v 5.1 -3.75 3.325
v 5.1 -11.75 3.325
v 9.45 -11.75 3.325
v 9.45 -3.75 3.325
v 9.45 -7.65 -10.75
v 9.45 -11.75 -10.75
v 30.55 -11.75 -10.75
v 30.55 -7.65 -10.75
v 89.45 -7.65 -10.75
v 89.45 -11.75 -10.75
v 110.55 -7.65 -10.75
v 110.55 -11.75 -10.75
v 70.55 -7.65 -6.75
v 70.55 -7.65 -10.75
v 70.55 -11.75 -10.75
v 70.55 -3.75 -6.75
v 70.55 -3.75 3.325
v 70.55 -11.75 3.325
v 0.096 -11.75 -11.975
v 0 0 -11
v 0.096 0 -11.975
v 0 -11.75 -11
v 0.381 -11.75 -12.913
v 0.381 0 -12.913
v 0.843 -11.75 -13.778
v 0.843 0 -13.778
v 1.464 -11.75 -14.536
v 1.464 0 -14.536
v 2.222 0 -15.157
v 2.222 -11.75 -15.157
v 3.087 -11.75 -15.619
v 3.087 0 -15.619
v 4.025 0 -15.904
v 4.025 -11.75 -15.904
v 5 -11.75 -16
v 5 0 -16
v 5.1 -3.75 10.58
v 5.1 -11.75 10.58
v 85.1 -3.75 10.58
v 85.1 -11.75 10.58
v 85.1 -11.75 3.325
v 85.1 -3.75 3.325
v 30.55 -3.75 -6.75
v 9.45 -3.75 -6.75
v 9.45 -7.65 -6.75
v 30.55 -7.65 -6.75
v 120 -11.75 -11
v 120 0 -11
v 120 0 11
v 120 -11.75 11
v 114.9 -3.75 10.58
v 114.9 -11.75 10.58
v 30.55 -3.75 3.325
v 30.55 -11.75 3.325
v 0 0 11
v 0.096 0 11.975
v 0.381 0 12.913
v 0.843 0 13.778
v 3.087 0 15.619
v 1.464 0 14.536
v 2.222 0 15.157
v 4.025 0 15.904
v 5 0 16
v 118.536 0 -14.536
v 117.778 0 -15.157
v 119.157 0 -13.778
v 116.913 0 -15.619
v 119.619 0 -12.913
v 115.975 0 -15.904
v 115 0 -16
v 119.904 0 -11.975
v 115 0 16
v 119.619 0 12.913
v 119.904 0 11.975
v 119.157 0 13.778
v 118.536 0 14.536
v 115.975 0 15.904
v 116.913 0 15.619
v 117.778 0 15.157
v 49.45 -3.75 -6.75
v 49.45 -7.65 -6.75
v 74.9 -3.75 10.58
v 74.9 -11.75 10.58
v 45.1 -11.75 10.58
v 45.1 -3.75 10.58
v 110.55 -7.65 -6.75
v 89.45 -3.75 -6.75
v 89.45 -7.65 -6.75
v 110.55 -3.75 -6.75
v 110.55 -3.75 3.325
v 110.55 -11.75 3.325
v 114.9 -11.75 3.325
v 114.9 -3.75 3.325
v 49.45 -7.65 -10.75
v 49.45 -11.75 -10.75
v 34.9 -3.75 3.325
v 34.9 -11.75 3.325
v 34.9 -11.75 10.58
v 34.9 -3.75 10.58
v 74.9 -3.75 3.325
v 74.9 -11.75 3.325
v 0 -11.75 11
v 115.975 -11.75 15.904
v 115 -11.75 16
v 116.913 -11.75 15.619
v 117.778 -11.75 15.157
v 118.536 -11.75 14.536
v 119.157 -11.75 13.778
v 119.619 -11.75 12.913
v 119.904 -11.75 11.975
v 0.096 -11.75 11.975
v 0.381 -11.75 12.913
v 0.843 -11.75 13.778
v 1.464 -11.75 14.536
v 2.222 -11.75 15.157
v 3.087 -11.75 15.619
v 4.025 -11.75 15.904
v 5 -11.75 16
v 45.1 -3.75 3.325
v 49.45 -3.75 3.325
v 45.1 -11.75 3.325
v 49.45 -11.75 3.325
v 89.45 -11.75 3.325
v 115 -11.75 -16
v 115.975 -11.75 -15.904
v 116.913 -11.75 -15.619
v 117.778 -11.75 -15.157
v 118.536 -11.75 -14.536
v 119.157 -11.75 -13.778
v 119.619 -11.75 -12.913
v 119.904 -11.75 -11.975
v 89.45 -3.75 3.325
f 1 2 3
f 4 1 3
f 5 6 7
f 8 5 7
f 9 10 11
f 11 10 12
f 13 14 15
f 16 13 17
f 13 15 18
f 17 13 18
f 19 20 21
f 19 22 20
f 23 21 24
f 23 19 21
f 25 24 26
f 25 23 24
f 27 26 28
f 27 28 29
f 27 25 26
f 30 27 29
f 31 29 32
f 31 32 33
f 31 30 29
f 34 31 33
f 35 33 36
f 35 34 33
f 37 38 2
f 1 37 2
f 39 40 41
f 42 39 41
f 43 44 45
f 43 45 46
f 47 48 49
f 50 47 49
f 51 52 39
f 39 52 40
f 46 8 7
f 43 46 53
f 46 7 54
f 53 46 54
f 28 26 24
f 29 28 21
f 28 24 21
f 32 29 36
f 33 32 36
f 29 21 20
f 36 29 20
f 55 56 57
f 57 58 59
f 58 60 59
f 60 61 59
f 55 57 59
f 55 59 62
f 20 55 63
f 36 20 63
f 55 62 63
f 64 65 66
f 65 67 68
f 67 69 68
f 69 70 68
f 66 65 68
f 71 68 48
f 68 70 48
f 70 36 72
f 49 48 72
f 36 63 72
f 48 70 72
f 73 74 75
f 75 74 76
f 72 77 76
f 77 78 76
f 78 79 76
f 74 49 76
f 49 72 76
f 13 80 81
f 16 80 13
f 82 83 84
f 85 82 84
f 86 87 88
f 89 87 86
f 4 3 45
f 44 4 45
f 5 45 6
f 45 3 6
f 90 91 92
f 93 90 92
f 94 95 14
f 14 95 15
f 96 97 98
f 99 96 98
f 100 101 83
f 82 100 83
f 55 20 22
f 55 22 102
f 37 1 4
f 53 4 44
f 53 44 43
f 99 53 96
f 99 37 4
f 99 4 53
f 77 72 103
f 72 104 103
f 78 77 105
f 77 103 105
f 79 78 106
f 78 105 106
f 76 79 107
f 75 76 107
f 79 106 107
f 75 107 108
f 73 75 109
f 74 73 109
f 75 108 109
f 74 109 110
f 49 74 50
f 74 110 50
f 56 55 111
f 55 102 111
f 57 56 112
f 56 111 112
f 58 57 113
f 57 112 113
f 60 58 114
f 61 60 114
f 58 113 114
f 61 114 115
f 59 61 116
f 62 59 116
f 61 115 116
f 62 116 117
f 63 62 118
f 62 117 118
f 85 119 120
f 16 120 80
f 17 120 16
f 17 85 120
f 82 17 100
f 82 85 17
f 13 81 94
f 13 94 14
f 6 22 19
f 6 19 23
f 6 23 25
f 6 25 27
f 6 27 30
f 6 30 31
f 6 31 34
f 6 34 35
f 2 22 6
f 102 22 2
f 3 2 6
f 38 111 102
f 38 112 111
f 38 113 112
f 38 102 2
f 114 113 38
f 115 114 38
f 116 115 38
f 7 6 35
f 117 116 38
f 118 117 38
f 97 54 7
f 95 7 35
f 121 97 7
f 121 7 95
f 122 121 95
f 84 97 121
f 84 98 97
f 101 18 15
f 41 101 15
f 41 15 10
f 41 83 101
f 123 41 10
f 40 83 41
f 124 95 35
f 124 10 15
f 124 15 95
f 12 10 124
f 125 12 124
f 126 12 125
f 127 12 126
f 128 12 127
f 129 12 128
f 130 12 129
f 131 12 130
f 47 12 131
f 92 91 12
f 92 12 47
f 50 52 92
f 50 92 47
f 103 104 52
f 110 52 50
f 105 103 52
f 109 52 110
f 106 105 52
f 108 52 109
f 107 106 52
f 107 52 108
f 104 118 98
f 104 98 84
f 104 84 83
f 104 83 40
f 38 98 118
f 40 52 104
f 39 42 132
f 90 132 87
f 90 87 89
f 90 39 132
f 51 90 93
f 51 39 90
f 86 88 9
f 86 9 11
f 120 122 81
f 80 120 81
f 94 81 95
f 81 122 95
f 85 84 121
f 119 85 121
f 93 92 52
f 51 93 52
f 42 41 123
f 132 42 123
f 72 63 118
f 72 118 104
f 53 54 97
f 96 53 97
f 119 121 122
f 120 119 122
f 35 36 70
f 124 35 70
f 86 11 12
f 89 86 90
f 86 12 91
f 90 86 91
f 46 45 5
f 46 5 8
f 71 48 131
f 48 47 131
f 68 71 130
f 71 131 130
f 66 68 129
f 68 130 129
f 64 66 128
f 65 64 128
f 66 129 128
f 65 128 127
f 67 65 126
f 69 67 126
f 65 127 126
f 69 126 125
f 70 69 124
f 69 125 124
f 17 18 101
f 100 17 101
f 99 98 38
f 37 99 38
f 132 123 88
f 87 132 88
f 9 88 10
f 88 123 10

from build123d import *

# Parameters (mm, degrees)
F0_W     = 240
F0_H     = 32
F1_DEPTH = 11.75
F4_DEPTH = 8
F5_W     = 21.1
F5_H     = 4
F6_DEPTH = 3.9
F7_W     = 130
F7_H     = 80
F8_DEPTH = 30
F9_R     = 5


with BuildPart() as f1:
    # F0 (on Front) → F1 (new body)
    with BuildSketch(Plane.XZ):
        Rectangle(F0_W, F0_H)
    extrude(amount=F1_DEPTH)

    # F3 (on face) → F4 (cut)
    with BuildSketch(Plane.XZ.offset(11.75)):
        Polygon((114.9, 10.58), (85.1, 10.58), (85.1, 3.325), (89.45, 3.325), (89.45, -10.75), (110.55, -10.75), (110.55, 3.325), (114.9, 3.325), align=None)
        Polygon((74.9, 10.58), (45.1, 10.58), (45.1, 3.325), (49.45, 3.325), (49.45, -10.75), (70.55, -10.75), (70.55, 3.325), (74.9, 3.325), align=None)
        Polygon((34.9, 10.58), (5.1, 10.58), (5.1, 3.325), (9.45, 3.325), (9.45, -10.75), (30.55, -10.75), (30.55, 3.325), (34.9, 3.325), align=None)
        Polygon((-5.1, 10.58), (-34.9, 10.58), (-34.9, 3.325), (-30.55, 3.325), (-30.55, -10.75), (-9.45, -10.75), (-9.45, 3.325), (-5.1, 3.325), align=None)
        Polygon((-45.1, 10.58), (-74.9, 10.58), (-74.9, 3.325), (-70.55, 3.325), (-70.55, -10.75), (-49.45, -10.75), (-49.45, 3.325), (-45.1, 3.325), align=None)
        Polygon((-85.1, 10.58), (-114.9, 10.58), (-114.9, 3.325), (-110.55, 3.325), (-110.55, -10.75), (-89.45, -10.75), (-89.45, 3.325), (-85.1, 3.325), align=None)
    extrude(amount=-F4_DEPTH, mode=Mode.SUBTRACT)

    # F5 (on face) → F6 (join)
    with BuildSketch(Plane.XZ.offset(3.75)):
        with Locations((100, -8.75)):
            Rectangle(F5_W, F5_H)
        with Locations((60, -8.75)):
            Rectangle(F5_W, F5_H)
        with Locations((20, -8.75)):
            Rectangle(F5_W, F5_H)
        with Locations((-20, -8.75)):
            Rectangle(F5_W, F5_H)
        with Locations((-60, -8.75)):
            Rectangle(F5_W, F5_H)
        with Locations((-100, -8.75)):
            Rectangle(F5_W, F5_H)
    extrude(amount=F6_DEPTH)

    # F7 (on Front) → F8 (cut)
    with BuildSketch(Plane.XZ):
        with Locations((-65, 0.10457)):
            Rectangle(F7_W, F7_H)
    extrude(amount=F8_DEPTH, mode=Mode.SUBTRACT)

    # F9
    f9_edges = [f1.edges().sort_by_distance(p)[0] for p in [
        (120, -5.875, -16),
        (120, -5.875, 16),
        (0, -5.875, -16),
        (0, -5.875, 16),
    ]]
    fillet(f9_edges, radius=F9_R)


solid = f1.part
